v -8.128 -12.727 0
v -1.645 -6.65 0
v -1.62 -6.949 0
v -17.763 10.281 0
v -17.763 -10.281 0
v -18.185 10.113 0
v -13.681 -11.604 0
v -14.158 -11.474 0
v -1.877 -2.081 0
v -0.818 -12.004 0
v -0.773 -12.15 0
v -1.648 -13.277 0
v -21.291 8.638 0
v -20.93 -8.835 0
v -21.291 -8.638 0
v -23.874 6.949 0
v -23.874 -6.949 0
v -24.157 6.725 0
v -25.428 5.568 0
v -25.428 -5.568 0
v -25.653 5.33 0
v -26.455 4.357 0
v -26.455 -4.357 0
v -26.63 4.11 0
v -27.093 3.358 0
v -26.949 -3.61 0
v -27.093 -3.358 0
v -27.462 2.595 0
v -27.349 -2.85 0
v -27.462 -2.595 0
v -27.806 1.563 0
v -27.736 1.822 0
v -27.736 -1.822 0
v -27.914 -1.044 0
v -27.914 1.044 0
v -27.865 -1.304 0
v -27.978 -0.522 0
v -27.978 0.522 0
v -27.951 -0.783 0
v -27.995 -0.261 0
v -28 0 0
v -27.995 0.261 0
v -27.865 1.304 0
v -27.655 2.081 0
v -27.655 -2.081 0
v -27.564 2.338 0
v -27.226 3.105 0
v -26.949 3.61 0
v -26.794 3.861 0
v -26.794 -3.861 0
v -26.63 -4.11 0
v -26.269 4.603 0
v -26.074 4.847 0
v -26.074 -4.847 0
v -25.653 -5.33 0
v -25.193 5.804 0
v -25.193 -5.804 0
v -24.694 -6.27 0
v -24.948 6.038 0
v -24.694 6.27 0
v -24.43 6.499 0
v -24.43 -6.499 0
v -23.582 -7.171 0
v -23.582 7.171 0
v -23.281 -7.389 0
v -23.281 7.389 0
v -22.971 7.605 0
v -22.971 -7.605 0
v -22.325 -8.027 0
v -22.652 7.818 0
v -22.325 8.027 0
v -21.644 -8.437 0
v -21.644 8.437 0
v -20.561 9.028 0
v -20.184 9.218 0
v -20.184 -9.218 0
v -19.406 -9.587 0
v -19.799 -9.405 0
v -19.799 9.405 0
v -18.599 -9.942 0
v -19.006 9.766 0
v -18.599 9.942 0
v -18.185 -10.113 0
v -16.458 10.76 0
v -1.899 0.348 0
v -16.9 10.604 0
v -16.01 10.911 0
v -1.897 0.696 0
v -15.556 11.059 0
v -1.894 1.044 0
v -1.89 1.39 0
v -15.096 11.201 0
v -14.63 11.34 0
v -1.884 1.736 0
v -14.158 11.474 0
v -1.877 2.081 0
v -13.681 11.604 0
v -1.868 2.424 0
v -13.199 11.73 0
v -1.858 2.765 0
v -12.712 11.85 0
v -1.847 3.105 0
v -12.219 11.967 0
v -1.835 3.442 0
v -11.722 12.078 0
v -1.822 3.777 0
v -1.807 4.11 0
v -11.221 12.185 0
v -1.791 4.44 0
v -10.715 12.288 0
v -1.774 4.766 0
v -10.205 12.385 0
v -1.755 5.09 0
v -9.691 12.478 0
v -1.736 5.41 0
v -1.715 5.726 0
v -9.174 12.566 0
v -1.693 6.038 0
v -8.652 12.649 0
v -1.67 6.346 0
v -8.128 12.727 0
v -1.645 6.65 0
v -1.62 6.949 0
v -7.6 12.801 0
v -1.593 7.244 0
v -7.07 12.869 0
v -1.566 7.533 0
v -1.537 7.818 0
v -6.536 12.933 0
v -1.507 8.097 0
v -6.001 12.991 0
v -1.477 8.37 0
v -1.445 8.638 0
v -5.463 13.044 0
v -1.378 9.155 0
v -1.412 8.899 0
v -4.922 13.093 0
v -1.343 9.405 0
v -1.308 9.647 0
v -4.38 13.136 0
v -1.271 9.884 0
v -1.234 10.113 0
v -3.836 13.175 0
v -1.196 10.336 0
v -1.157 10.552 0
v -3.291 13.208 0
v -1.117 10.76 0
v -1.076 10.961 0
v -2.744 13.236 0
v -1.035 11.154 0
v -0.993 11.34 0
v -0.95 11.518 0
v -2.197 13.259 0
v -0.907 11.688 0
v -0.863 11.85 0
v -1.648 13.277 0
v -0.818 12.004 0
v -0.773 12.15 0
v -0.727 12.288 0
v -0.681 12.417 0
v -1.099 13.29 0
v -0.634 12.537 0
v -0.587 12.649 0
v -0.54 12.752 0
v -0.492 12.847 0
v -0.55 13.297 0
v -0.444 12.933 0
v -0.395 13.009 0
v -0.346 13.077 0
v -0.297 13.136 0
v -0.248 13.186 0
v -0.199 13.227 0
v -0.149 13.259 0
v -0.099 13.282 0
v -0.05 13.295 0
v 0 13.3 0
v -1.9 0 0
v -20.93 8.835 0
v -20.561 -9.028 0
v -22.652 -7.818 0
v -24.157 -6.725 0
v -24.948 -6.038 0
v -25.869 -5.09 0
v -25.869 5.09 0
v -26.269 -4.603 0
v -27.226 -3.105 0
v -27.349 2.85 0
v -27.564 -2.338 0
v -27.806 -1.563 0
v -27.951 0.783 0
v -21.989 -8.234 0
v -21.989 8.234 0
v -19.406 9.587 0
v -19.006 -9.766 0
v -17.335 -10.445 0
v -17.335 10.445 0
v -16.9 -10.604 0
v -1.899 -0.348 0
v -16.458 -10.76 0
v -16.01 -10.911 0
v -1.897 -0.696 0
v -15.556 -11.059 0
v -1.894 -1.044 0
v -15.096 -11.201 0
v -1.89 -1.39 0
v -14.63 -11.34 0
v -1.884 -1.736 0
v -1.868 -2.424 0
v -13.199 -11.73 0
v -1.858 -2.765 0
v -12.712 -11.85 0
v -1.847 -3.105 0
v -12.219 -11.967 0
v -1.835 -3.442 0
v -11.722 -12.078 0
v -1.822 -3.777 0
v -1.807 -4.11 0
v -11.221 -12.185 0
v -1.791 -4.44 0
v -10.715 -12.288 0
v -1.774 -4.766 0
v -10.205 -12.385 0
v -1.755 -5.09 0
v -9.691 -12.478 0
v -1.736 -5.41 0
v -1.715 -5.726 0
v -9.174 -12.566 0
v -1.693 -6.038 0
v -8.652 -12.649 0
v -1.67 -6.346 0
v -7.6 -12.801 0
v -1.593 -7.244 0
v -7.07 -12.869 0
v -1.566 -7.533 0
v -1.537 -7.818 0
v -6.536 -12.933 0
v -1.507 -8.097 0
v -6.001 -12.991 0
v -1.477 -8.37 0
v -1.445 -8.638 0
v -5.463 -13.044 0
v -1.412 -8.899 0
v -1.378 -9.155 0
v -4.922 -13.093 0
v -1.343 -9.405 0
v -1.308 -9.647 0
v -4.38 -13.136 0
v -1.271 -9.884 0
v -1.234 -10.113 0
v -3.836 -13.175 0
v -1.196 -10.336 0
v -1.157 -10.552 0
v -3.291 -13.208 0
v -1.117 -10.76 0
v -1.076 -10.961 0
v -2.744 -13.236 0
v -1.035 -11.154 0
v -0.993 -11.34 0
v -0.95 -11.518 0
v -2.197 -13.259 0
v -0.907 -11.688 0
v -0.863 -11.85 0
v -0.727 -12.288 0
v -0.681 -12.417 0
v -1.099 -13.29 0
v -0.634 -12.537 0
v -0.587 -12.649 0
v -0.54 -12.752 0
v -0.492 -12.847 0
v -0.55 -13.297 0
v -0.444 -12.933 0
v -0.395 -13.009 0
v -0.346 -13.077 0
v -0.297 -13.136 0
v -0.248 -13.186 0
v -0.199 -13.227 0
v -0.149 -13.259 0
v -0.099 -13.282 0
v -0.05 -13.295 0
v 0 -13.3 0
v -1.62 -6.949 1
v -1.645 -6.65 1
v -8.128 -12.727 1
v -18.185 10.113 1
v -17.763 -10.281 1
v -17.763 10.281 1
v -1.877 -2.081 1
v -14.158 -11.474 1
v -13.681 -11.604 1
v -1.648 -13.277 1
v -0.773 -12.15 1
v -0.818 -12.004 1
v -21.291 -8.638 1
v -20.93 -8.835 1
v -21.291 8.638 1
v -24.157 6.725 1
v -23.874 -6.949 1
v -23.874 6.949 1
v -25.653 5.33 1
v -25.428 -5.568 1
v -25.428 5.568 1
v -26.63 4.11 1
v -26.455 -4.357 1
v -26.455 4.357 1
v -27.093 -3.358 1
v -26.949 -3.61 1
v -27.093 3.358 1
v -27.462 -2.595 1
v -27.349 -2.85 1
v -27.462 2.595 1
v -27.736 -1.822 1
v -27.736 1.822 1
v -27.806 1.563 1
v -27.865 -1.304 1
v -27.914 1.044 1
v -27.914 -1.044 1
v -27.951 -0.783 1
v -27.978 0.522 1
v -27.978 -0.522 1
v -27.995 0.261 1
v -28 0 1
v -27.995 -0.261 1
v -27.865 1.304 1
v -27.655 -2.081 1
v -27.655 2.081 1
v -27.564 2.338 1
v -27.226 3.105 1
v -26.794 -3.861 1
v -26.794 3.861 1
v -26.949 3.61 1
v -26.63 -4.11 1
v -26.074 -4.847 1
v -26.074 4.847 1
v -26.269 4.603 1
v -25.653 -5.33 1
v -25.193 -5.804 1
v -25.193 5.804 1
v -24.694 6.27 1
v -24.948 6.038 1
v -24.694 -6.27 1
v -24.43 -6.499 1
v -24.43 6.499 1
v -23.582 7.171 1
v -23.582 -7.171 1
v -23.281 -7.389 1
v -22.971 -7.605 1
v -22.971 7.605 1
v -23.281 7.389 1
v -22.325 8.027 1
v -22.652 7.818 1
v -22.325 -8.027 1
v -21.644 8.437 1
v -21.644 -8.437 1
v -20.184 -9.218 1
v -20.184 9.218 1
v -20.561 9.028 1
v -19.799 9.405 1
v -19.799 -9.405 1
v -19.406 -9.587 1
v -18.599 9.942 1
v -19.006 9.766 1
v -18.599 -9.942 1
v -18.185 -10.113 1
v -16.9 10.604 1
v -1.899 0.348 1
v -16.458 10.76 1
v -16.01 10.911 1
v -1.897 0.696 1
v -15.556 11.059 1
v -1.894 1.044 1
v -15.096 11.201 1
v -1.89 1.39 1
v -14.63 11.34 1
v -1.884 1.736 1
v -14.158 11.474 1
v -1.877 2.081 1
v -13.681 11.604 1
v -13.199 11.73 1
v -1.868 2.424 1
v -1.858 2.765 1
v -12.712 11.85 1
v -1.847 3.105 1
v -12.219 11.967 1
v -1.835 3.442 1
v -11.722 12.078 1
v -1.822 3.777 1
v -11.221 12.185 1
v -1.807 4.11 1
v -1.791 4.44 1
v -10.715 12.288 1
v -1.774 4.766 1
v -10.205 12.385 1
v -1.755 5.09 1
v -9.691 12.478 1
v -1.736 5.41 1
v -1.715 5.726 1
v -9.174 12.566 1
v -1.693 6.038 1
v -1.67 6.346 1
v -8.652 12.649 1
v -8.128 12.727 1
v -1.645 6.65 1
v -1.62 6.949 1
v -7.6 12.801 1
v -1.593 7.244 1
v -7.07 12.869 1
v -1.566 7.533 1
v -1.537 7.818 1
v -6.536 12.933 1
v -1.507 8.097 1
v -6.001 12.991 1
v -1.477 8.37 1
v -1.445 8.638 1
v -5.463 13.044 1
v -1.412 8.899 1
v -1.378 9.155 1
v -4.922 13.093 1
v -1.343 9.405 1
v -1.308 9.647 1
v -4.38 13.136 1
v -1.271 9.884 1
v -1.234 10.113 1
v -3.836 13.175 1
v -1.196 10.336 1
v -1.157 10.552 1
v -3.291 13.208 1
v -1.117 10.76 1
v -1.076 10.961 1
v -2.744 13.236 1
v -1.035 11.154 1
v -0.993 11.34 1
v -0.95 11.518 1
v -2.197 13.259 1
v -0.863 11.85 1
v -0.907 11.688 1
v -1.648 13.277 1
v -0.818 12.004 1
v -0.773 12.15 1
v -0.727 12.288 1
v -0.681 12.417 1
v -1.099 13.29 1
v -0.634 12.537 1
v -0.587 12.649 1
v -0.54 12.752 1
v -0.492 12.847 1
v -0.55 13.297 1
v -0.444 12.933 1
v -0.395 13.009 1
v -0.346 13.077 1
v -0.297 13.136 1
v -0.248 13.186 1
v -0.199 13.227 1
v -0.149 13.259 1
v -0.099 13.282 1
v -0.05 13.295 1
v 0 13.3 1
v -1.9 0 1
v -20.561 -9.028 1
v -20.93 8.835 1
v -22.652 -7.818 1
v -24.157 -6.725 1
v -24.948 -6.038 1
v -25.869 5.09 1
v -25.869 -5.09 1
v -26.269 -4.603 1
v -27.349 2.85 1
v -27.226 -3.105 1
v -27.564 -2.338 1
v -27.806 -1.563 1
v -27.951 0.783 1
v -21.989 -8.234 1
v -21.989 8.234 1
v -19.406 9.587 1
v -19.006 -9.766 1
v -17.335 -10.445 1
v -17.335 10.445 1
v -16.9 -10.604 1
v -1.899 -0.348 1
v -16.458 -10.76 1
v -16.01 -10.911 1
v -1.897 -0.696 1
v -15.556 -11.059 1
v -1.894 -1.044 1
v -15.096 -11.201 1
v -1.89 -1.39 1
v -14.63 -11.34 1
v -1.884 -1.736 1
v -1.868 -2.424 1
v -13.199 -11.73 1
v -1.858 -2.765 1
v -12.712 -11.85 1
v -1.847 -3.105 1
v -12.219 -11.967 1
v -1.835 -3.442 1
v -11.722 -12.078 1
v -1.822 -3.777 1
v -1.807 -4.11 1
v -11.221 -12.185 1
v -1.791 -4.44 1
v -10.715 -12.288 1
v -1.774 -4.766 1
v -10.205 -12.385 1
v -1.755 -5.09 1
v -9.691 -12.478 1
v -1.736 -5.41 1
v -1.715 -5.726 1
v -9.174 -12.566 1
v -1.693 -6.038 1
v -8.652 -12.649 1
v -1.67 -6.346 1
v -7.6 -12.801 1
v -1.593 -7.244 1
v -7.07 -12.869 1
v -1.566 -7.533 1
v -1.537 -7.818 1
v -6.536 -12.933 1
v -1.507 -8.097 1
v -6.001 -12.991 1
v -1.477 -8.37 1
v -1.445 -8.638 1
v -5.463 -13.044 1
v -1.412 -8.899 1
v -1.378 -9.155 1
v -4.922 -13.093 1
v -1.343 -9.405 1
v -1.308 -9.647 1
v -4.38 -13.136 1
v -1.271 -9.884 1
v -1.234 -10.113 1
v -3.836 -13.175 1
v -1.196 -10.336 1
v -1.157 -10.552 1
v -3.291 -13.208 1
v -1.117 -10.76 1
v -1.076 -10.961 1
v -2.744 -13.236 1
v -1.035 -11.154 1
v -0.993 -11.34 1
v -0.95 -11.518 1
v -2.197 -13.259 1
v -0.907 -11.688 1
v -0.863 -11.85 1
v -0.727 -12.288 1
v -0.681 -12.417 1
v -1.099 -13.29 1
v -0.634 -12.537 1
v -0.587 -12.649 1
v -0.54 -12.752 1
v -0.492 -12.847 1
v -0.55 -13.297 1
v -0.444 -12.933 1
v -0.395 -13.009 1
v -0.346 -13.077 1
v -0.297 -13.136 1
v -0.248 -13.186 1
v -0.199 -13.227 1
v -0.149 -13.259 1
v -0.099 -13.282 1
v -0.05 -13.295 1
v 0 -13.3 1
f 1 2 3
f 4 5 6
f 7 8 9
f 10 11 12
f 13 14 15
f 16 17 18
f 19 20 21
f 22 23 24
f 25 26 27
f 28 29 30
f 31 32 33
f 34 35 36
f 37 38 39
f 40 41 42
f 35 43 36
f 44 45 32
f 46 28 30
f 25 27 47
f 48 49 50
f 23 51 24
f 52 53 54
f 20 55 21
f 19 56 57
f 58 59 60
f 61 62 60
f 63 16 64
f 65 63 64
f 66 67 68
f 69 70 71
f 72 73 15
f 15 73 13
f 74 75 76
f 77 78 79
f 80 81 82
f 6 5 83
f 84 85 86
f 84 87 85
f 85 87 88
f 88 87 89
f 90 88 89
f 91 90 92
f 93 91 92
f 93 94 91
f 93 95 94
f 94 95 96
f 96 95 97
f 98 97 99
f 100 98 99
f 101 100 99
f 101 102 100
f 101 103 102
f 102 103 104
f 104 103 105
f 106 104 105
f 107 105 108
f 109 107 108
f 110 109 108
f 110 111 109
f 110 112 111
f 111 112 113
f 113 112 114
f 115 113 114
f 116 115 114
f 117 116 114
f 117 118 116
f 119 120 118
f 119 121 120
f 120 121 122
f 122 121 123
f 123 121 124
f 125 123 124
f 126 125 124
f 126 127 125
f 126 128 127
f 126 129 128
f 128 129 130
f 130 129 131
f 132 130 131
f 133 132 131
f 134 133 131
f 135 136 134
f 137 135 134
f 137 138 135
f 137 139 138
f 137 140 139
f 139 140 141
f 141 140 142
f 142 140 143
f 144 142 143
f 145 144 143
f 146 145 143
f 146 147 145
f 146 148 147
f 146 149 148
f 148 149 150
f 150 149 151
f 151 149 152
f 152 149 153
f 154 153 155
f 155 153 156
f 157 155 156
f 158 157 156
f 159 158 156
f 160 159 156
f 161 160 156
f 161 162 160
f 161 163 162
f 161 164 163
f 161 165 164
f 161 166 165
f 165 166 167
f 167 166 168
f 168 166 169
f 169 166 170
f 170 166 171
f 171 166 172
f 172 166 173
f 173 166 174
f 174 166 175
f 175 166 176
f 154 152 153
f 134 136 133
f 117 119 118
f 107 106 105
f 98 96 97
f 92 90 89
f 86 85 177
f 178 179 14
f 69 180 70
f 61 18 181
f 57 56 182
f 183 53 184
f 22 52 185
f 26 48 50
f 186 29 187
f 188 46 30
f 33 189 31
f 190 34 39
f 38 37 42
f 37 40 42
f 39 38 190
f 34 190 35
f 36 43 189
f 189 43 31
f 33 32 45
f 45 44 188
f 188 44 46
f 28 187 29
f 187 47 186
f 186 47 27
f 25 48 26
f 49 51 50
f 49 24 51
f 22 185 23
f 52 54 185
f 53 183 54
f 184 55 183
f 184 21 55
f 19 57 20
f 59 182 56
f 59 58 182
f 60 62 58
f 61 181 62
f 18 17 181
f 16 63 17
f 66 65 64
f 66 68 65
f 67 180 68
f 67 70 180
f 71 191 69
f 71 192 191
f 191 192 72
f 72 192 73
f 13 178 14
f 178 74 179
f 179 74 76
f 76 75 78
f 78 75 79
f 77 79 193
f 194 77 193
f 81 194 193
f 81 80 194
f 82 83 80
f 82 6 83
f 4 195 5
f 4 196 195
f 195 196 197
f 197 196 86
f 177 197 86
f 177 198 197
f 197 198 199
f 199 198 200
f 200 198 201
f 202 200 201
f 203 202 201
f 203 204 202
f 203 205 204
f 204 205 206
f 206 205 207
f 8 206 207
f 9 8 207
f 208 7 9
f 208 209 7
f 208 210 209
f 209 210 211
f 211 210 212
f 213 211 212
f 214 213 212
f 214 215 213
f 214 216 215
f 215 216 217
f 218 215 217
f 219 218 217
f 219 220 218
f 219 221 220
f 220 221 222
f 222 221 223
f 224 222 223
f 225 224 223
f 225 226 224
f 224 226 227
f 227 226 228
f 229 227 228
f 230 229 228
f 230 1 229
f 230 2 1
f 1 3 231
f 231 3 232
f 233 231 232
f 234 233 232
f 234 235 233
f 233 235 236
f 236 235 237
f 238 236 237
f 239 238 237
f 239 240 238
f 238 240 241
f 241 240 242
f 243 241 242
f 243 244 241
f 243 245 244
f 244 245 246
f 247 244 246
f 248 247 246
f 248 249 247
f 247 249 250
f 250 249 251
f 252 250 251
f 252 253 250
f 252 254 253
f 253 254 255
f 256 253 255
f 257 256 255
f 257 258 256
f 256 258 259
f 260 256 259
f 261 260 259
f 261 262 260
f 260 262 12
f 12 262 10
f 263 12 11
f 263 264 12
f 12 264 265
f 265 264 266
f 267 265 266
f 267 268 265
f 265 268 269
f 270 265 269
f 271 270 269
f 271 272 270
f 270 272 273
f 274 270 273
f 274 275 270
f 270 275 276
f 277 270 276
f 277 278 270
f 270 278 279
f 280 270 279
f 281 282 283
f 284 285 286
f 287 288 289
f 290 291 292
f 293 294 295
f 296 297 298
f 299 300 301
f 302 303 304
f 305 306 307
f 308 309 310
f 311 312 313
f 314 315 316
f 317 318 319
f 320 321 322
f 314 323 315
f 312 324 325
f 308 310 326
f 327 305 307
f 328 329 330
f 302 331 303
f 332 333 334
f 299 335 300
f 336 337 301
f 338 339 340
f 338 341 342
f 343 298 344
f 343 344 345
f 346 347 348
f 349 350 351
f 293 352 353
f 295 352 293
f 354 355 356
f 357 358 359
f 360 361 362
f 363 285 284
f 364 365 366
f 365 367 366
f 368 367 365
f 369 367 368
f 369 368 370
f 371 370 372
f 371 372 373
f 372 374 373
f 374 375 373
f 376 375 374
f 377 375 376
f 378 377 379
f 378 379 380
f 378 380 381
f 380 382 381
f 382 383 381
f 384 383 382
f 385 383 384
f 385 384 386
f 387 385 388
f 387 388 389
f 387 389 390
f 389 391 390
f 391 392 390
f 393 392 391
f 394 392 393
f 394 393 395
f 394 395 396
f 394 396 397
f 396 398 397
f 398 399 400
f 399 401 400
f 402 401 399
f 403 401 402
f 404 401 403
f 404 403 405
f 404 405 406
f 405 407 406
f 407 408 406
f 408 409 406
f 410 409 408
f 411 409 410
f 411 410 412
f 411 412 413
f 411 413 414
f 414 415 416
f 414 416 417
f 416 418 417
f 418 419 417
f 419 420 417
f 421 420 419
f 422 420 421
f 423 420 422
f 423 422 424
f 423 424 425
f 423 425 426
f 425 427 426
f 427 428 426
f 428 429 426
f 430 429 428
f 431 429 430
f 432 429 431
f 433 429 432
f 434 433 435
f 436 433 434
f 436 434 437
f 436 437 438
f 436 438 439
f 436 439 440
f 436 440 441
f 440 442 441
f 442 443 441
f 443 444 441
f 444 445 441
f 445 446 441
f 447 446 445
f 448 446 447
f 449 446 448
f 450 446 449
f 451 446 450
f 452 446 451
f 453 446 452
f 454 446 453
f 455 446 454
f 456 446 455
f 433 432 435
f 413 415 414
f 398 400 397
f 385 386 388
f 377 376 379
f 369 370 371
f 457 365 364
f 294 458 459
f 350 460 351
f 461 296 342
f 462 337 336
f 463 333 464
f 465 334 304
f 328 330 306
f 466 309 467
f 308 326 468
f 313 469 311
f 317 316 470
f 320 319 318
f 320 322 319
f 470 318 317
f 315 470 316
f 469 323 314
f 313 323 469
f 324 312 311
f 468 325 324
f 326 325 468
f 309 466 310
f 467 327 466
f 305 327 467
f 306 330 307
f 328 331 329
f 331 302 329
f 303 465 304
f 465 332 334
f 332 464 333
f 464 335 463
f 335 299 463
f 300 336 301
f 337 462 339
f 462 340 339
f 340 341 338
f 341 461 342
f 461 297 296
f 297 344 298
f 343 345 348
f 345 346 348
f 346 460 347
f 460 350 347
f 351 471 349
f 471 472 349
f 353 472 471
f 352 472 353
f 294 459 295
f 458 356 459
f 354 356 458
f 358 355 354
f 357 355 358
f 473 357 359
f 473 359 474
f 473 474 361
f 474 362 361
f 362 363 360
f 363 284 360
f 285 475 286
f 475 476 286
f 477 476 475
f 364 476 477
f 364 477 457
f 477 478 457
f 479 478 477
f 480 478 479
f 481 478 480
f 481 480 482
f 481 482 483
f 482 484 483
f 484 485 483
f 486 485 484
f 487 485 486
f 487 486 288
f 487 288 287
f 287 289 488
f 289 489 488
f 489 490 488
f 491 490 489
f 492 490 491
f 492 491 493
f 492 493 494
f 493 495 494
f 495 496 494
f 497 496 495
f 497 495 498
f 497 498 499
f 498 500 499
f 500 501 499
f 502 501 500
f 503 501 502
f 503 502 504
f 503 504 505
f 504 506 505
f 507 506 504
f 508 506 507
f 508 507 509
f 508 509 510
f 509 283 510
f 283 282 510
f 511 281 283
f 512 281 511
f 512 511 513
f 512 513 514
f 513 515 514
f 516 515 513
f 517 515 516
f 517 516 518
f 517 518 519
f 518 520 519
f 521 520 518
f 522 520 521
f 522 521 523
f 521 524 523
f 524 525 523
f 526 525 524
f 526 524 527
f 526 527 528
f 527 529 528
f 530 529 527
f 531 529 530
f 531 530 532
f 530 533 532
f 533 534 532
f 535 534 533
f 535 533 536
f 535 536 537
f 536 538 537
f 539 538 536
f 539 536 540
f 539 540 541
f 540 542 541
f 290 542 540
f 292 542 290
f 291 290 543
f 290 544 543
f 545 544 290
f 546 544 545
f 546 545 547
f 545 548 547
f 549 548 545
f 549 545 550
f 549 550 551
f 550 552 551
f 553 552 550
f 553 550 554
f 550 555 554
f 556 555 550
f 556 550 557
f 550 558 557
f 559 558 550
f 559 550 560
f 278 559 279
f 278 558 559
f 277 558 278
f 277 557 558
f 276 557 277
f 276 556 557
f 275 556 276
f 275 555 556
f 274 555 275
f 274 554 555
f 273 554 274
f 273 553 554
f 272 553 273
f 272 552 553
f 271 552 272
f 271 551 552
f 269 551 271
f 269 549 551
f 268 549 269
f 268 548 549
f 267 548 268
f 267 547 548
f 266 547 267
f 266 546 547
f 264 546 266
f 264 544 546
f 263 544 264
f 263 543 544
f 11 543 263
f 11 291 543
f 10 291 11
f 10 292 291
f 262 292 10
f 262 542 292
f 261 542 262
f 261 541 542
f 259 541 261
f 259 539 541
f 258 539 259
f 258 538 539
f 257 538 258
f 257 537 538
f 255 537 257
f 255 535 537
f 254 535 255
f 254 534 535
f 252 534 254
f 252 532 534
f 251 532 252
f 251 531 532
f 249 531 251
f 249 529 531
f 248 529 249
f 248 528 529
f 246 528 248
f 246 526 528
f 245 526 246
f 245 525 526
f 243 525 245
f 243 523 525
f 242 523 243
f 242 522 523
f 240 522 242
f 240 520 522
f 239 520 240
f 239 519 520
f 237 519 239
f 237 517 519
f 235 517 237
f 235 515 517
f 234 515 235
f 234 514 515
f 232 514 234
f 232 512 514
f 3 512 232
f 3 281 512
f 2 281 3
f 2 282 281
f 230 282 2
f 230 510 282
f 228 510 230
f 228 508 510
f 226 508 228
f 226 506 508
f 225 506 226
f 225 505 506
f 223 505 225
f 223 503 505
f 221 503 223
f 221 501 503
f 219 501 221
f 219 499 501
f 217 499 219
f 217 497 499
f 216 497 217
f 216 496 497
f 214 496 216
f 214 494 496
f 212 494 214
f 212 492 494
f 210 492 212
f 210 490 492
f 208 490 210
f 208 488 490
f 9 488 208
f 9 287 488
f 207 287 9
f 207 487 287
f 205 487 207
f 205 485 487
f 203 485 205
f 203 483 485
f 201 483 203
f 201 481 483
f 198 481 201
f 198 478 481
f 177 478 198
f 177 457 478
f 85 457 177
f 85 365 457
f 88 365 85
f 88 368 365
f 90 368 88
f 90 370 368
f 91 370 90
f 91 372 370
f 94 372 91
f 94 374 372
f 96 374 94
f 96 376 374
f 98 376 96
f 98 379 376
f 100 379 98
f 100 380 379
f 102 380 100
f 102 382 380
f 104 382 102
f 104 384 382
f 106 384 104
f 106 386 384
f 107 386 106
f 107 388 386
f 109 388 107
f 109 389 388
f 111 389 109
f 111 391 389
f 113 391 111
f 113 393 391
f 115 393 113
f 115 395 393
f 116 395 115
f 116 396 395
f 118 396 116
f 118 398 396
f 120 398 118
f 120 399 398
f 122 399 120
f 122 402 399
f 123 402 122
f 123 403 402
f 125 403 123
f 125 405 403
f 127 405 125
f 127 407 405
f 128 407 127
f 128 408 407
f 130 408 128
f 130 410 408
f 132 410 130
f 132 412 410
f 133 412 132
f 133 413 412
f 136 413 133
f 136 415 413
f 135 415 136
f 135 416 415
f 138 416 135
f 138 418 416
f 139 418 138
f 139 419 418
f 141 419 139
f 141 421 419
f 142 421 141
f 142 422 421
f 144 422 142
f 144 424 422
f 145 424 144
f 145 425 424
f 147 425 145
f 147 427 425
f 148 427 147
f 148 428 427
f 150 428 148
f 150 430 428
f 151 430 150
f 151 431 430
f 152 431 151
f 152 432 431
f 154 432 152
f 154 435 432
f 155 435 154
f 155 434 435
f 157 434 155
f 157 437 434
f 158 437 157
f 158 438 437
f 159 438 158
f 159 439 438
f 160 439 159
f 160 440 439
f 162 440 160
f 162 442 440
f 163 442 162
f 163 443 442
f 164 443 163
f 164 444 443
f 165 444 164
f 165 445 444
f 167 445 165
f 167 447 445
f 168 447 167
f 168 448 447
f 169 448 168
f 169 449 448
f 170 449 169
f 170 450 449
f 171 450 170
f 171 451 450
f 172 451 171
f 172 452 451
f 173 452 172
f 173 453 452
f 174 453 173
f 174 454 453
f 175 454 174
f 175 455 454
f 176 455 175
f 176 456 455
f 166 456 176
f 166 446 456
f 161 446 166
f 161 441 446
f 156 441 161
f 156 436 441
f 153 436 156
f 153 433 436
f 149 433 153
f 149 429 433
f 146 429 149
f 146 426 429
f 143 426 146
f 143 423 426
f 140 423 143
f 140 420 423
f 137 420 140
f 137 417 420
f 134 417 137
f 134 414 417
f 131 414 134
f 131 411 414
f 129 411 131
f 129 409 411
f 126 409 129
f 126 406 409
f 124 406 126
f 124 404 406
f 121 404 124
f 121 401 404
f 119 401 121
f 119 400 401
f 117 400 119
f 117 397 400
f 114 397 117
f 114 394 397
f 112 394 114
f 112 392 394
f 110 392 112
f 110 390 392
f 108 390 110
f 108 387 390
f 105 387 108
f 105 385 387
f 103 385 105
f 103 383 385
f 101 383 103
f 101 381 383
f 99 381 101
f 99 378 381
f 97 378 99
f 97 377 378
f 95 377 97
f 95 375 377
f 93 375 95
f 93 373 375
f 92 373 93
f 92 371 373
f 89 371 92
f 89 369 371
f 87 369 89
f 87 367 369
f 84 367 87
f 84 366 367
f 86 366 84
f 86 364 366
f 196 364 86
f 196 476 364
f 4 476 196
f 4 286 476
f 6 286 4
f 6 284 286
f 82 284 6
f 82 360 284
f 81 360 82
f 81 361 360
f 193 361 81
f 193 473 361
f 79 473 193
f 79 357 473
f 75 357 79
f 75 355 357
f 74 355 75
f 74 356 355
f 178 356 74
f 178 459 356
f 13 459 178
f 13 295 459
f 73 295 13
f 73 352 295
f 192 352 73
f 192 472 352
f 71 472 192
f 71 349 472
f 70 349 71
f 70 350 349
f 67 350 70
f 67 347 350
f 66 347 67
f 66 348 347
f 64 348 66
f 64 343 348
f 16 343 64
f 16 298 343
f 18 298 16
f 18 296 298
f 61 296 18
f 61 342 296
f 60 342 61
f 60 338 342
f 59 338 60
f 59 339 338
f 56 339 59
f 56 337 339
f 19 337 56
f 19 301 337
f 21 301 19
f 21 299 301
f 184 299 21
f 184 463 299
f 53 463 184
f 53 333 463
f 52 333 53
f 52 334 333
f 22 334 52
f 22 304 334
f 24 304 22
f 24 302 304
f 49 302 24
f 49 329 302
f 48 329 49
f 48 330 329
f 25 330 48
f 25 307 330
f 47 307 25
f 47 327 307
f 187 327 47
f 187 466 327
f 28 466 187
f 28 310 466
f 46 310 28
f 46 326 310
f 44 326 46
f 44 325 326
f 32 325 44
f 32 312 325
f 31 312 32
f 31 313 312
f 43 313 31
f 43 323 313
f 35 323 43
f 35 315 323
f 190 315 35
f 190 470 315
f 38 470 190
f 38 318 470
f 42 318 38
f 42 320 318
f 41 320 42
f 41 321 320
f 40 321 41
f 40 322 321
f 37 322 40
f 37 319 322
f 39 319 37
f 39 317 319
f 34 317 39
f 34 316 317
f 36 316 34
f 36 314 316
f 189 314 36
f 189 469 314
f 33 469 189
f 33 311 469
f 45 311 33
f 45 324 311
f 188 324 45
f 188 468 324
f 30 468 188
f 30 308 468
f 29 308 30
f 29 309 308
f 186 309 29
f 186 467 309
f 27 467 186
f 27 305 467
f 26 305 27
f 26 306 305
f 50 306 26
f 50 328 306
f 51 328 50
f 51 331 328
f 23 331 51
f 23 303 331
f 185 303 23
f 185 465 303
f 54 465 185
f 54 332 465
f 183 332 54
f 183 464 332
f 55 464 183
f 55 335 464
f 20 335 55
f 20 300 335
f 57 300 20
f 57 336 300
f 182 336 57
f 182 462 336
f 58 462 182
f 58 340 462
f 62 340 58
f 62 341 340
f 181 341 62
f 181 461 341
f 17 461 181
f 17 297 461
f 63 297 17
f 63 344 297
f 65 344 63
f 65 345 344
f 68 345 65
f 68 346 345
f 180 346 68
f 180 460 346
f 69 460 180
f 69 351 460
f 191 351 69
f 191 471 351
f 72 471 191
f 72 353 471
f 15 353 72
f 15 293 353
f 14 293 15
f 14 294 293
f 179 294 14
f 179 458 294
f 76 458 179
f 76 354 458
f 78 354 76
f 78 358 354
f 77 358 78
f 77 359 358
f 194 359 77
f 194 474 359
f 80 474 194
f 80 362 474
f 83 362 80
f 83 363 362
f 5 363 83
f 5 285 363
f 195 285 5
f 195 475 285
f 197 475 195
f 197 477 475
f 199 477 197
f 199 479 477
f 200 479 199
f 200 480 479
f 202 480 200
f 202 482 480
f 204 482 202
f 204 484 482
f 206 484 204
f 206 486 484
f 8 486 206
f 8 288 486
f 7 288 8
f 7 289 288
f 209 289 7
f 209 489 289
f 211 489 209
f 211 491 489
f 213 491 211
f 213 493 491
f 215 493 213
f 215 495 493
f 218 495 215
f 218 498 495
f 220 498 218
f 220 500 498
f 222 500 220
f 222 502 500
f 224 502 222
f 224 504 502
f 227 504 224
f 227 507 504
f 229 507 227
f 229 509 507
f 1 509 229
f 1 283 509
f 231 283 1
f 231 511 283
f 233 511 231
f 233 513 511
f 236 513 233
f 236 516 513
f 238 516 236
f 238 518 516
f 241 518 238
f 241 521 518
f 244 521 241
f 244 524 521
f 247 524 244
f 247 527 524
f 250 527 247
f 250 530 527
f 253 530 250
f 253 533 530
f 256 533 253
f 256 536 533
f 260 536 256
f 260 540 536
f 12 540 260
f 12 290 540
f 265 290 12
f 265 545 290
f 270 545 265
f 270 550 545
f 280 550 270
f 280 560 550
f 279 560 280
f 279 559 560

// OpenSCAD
/*
Parametric crescent-shaped plastic piece.

Geometry:
- Convex half-ellipse on the left.
- Concave semicircle on the right.
- Two sharp junctions at the top and bottom.
- Uniform extrusion thickness.

All dimensions are in millimeters.
*/

overall_width  = 28.0;   // From leftmost outer edge to the two corner line
overall_height = 26.6;   // Distance between the two sharp corners
thickness      = 1.0;

outer_segments = 160;
inner_segments = 120;

module plastic_piece_2d(
    width = overall_width,
    height = overall_height,
    outer_fn = outer_segments,
    inner_fn = inner_segments
) {
    half_height = height / 2;
    //inner_radius = half_height/8;  // True semicircle
    inner_radius = half_height/7;  // True semicircle

    /*
      Both curves share endpoints at:
          [0,  height/2]
          [0, -height/2]

      The outer ellipse reaches x = -width.
      The inner semicircle reaches x = -height/2.
    */

    outer_arc = [
        for (i = [0 : outer_fn])
            let(a = 90 + 180 * i / outer_fn)
            [
                width * cos(a),
                half_height * sin(a)
            ]
    ];

    inner_arc = [
        for (i = [0 : inner_fn])
            let(a = -90 + 180 * i / inner_fn)
            [
                -inner_radius * cos(a),
                half_height * sin(a)
            ]
    ];

    polygon(points = concat(outer_arc, inner_arc));
}

linear_extrude(height = thickness, convexity = 10)
    plastic_piece_2d();
